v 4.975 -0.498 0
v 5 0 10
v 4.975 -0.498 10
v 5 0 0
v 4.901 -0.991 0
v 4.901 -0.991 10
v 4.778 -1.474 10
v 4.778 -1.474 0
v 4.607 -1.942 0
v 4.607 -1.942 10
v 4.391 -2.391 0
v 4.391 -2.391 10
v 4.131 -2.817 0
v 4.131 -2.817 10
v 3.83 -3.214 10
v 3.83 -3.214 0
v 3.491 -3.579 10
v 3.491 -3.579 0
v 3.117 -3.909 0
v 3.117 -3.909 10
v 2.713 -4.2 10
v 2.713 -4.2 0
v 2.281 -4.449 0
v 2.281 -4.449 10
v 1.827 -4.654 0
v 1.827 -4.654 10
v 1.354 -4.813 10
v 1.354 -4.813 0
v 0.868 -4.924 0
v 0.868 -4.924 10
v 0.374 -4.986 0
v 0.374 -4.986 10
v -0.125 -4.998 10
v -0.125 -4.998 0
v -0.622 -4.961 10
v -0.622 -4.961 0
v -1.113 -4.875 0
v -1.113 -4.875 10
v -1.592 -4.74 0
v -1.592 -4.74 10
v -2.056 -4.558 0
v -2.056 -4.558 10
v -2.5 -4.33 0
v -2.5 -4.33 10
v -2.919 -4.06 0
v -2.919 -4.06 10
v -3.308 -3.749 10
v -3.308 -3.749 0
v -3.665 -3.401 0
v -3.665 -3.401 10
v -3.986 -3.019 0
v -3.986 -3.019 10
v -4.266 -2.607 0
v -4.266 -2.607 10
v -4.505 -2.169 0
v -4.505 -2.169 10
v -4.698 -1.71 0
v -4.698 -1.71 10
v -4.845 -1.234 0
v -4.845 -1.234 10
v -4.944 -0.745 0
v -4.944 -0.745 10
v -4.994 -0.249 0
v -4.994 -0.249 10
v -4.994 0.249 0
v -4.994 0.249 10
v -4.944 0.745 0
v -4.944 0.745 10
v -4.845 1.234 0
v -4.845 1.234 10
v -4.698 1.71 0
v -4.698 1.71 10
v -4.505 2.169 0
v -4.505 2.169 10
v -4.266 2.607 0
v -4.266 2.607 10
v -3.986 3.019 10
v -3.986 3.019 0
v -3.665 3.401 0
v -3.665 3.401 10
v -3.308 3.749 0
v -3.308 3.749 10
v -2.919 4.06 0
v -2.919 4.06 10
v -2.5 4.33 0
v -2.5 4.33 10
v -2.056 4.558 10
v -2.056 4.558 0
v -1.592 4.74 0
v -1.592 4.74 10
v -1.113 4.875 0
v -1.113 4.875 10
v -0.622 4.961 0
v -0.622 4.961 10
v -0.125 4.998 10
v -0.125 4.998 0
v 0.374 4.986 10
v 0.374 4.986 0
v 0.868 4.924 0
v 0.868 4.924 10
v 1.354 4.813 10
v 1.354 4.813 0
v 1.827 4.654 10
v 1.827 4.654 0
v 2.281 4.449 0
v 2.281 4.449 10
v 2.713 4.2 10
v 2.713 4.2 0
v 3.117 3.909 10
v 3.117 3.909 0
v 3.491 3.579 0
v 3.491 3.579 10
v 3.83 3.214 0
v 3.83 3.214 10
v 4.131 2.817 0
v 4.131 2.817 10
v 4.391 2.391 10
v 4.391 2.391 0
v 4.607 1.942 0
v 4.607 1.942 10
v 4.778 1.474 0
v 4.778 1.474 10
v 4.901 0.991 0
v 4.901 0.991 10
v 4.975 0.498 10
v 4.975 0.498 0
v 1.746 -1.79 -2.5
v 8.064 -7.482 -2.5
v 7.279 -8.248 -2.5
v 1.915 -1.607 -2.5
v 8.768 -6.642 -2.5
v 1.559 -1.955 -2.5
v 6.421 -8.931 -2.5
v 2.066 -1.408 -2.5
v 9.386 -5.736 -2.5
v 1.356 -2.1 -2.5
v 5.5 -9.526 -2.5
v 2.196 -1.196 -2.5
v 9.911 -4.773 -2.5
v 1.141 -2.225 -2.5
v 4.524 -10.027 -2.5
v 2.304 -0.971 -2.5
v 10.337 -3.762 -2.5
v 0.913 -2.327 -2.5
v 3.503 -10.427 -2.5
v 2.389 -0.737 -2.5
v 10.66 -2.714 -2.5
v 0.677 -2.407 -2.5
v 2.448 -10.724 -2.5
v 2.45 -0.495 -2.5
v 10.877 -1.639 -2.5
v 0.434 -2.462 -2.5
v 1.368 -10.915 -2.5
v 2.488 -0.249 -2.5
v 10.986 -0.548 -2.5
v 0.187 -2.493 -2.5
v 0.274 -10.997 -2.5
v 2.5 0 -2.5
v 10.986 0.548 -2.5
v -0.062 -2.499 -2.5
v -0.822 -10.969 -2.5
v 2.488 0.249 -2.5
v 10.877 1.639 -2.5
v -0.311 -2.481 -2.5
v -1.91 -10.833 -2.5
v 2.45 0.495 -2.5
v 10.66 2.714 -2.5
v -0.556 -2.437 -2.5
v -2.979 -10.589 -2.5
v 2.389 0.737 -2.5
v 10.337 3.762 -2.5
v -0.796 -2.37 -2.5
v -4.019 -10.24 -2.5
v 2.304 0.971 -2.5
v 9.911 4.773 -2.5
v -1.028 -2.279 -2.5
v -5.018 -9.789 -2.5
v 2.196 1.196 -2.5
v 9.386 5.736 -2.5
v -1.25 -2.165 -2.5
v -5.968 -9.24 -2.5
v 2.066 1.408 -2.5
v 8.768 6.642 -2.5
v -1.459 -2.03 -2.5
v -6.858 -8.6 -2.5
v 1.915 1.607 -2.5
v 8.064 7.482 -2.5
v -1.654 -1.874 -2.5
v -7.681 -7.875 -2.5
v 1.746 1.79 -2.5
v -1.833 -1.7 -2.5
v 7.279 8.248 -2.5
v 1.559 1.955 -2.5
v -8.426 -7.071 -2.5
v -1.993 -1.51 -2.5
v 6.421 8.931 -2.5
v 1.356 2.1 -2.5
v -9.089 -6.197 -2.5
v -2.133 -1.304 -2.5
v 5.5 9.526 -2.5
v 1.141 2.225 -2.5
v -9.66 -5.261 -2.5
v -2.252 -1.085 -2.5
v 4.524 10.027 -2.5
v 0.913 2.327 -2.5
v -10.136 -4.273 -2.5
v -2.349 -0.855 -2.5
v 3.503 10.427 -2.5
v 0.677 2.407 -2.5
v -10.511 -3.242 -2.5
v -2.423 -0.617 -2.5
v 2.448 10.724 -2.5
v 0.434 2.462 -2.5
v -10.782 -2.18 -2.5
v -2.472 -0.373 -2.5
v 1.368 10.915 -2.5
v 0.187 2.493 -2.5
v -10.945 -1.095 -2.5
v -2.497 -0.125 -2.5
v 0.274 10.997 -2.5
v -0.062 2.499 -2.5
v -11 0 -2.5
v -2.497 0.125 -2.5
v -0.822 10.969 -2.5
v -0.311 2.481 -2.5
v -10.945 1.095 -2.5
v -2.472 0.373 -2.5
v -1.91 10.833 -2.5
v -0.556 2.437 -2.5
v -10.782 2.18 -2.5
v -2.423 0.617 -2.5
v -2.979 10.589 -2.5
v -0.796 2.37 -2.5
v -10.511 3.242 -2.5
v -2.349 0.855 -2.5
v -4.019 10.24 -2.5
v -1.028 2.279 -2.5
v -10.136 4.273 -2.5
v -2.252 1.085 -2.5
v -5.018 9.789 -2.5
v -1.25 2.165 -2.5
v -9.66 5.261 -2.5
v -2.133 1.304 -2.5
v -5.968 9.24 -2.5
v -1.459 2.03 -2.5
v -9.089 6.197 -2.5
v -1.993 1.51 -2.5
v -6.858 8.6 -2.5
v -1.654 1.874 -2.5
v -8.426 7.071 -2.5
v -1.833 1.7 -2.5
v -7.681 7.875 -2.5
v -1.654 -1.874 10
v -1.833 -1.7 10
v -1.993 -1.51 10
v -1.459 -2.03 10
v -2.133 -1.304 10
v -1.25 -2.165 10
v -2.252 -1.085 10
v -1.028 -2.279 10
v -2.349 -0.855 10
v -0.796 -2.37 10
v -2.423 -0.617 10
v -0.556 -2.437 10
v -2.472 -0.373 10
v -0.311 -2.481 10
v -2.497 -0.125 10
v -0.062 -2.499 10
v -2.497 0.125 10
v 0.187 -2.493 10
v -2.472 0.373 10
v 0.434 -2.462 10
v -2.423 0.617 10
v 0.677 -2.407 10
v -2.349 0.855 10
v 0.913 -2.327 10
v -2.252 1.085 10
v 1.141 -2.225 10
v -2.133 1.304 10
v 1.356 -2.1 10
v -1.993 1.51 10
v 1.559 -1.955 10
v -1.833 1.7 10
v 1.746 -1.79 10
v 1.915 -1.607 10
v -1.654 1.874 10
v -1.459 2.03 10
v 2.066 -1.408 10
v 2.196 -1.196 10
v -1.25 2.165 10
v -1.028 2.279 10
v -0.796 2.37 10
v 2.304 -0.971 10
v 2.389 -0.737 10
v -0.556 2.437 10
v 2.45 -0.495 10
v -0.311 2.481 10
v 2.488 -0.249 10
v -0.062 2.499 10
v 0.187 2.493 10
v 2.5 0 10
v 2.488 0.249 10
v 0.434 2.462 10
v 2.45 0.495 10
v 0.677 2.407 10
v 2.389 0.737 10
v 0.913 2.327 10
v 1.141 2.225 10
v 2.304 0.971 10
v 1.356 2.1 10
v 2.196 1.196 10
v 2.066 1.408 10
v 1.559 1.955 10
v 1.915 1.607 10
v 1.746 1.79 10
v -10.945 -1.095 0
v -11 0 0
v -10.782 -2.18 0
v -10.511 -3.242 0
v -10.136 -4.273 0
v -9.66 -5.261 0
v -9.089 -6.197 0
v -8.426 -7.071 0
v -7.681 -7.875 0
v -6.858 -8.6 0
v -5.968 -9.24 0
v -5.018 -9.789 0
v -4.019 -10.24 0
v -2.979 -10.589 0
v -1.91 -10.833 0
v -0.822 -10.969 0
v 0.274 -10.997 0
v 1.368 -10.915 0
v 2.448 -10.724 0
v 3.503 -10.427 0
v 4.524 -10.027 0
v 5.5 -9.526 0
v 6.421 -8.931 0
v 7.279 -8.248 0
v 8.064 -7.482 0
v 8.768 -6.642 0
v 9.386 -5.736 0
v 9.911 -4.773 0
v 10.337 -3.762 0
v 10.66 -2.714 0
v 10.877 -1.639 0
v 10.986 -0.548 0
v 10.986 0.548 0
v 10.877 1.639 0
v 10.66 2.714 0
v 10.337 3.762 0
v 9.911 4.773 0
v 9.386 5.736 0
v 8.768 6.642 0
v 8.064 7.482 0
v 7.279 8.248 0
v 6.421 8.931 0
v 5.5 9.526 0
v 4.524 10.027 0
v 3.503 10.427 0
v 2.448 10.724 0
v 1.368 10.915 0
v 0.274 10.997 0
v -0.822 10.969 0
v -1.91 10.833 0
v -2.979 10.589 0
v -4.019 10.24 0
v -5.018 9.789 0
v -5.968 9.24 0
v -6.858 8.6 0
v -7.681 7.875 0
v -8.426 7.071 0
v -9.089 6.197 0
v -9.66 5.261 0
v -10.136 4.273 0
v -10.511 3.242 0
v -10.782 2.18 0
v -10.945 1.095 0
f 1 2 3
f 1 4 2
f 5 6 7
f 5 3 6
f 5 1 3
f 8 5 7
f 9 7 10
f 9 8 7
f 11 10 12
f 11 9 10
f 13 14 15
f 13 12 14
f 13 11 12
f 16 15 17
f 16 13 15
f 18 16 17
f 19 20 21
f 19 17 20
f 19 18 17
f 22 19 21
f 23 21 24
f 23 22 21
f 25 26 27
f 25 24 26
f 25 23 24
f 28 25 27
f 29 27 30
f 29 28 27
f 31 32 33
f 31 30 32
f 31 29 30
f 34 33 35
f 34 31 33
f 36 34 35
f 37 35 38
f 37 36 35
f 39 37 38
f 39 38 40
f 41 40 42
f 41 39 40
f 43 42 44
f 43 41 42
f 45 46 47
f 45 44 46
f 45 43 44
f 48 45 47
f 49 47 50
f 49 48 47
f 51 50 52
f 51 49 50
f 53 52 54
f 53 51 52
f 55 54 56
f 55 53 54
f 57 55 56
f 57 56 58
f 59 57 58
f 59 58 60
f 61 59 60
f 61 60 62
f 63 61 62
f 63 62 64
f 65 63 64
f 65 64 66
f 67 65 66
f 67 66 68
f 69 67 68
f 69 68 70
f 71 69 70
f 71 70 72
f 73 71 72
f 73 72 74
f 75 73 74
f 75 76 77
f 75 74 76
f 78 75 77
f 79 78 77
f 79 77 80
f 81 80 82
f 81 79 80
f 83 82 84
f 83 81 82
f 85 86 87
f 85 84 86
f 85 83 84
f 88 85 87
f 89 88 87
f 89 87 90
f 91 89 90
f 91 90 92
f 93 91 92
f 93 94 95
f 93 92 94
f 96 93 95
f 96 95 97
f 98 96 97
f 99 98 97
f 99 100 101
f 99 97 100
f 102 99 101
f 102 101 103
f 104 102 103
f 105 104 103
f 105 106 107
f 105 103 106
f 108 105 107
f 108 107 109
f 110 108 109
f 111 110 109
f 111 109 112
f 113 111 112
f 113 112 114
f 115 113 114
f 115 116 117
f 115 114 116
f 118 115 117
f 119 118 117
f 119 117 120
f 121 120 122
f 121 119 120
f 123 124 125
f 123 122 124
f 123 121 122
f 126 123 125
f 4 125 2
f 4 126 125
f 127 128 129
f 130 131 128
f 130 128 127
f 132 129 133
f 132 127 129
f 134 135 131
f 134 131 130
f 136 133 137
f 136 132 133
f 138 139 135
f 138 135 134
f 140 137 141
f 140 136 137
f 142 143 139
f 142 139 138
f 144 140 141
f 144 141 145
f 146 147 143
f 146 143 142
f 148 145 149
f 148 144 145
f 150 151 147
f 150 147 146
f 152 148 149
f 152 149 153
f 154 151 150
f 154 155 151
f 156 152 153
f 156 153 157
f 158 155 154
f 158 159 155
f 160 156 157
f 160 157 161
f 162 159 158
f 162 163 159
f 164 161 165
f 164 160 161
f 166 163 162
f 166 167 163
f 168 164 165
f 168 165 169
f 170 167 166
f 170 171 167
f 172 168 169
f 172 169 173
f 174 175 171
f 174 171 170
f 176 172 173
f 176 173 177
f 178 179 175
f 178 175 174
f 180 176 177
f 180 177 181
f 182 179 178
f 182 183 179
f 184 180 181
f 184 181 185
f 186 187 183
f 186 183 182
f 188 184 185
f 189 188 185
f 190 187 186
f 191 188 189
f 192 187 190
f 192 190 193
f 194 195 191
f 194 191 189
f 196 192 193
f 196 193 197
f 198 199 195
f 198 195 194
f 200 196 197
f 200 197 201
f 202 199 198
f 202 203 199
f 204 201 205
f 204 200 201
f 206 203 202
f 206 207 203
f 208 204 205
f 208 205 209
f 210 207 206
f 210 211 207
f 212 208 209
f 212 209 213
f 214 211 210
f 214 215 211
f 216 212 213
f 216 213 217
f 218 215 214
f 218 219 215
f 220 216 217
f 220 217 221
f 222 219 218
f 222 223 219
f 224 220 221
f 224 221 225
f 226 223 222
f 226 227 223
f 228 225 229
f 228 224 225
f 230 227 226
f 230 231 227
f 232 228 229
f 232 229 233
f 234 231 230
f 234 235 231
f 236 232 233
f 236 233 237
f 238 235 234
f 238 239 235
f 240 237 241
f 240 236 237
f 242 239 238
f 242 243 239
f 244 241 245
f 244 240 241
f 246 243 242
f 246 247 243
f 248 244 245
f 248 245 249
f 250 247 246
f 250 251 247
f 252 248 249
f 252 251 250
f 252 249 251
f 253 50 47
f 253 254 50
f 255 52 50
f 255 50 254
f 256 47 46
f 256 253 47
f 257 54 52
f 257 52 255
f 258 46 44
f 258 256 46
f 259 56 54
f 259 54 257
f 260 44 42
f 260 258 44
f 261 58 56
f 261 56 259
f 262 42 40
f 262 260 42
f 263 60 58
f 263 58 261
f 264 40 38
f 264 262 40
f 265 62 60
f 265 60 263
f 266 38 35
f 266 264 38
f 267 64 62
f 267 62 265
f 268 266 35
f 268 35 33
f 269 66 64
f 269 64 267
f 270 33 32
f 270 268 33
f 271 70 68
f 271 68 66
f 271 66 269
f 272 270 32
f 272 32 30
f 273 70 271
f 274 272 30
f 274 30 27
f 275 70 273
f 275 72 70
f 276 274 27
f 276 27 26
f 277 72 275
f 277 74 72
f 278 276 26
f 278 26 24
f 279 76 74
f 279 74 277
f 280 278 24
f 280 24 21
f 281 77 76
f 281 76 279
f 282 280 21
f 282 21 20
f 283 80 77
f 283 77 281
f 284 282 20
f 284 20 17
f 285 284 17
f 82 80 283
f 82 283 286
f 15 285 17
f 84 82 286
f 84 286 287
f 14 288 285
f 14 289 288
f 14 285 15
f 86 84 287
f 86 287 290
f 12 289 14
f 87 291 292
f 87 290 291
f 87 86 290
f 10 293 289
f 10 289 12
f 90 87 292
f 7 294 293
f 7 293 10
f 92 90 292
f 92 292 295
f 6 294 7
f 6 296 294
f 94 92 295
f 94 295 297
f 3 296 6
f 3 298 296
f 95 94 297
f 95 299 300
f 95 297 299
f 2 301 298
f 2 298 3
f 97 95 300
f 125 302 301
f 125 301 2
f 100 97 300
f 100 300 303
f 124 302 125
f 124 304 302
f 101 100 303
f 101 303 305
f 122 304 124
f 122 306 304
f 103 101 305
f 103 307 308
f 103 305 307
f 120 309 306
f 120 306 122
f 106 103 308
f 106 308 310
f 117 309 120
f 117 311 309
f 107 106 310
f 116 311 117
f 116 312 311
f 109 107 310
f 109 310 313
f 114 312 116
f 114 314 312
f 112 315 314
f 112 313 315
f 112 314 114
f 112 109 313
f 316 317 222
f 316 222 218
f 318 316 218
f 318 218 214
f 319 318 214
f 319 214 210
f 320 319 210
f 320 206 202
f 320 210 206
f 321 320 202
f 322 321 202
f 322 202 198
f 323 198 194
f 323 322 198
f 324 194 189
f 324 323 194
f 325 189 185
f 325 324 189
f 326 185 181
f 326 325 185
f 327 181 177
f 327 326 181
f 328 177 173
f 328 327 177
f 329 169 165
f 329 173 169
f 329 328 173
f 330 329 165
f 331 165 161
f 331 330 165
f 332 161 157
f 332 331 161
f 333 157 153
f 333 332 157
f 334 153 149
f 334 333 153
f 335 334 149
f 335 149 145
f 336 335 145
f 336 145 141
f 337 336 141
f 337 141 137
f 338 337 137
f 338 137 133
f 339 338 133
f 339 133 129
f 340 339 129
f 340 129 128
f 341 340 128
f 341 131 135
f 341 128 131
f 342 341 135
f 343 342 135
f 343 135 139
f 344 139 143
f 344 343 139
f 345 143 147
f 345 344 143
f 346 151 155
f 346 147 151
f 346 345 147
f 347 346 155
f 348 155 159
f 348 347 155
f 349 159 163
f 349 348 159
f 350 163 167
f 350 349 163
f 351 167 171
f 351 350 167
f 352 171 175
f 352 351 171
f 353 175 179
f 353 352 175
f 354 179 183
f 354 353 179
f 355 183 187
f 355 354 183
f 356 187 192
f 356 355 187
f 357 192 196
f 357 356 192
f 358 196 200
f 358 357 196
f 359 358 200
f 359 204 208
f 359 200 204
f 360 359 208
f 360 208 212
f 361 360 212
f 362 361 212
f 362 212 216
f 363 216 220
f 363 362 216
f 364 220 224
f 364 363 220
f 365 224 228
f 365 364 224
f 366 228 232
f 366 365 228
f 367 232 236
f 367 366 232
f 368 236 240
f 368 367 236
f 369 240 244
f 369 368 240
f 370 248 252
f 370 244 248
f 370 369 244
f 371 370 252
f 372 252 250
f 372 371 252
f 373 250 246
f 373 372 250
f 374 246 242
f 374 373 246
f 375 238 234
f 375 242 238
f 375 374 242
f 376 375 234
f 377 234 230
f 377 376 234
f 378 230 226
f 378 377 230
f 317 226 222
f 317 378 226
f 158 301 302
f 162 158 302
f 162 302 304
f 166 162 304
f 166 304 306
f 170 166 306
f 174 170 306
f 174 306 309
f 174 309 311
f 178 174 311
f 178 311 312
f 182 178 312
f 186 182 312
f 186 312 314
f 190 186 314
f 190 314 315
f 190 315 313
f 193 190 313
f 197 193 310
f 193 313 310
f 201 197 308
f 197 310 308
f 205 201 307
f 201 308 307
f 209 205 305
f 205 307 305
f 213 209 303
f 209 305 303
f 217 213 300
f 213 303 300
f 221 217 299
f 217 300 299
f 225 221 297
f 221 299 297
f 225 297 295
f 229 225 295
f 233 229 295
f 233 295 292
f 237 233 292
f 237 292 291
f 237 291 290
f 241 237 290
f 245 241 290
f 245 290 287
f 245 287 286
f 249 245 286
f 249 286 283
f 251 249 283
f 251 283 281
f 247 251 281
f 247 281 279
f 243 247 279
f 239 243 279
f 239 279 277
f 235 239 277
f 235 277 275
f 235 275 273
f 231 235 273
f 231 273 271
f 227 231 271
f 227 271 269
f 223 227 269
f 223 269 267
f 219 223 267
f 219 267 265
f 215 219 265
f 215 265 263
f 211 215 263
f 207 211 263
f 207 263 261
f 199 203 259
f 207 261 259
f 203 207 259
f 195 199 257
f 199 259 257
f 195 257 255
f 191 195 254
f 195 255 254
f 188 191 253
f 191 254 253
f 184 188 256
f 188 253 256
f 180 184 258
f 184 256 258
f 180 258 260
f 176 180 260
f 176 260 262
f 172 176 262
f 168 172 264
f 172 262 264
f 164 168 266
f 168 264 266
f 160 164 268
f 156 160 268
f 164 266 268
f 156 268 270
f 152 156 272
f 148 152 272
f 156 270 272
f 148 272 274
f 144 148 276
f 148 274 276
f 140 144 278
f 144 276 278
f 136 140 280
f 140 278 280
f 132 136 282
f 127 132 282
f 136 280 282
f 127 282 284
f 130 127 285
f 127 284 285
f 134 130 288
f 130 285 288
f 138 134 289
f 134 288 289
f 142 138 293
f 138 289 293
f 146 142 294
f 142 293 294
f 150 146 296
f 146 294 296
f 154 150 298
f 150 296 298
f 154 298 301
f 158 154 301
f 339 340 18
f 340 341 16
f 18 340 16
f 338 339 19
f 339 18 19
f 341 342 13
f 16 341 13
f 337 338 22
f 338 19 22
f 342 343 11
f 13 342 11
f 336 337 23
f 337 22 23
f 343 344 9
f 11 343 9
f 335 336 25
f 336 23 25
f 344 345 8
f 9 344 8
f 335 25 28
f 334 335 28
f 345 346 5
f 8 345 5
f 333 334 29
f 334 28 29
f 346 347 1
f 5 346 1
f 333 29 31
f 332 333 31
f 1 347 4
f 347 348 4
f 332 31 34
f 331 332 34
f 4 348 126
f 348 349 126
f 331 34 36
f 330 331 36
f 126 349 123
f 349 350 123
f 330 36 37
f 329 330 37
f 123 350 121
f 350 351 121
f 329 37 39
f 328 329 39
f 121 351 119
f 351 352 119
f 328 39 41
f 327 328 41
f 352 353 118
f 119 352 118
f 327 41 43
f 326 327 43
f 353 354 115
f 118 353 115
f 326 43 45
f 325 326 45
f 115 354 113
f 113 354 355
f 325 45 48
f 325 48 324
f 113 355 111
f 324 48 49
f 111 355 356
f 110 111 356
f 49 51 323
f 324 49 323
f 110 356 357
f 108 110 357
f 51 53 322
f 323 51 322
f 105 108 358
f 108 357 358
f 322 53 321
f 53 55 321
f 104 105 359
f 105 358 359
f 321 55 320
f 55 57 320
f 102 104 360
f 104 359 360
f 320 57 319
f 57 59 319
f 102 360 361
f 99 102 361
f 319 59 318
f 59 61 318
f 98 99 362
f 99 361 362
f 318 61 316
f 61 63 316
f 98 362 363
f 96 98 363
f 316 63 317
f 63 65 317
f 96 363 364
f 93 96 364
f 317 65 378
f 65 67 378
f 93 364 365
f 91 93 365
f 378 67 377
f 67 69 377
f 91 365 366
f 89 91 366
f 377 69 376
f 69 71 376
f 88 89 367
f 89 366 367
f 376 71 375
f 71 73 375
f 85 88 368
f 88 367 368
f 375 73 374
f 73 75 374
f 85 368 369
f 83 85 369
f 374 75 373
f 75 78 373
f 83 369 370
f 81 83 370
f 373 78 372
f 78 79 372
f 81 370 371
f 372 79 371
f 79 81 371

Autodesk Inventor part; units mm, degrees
ref_plane "YZ Plane" through (0, 0, 0) normal (1, 0, 0) x (0, 1, 0)
ref_plane "XZ Plane" through (0, 0, 0) normal (0, 1, 0) x (-1, 0, 0)
ref_plane "XY Plane" through (0, 0, 0) normal (0, 0, 1) x (1, 0, 0)
sketch "Эскиз1" plane through (0, 0, 0) normal (0, 0, 1) x (1, 0, 0)
  circle A0 centre (0, 0) radius 5
  dimension "d1" = 10
extrude "Выдавливание1" add sketch "Эскиз1" along normal blind 10
sketch "Эскиз2" plane through (0, 0, 0) normal (0, 0, -1) x (-1, 0, 0)
  circle A0 centre (0, 0) radius 11
  dimension "d4" = 22
extrude "Выдавливание2" add sketch "Эскиз2" along normal blind 2.5
sketch "Эскиз3" plane through (0, 0, 10) normal (0, 0, 1) x (1, 0, 0)
  circle A0 centre (0, 0) radius 2.5
  dimension "d7" = 5
extrude "Выдавливание3" cut sketch "Эскиз3" against normal blind 12.5
sketch "Эскиз4" plane through (0, 0, 0) normal (0, 0, 1) x (1, 0, 0)
  point P0 (0, 0)
properties part number "akfytw2"
